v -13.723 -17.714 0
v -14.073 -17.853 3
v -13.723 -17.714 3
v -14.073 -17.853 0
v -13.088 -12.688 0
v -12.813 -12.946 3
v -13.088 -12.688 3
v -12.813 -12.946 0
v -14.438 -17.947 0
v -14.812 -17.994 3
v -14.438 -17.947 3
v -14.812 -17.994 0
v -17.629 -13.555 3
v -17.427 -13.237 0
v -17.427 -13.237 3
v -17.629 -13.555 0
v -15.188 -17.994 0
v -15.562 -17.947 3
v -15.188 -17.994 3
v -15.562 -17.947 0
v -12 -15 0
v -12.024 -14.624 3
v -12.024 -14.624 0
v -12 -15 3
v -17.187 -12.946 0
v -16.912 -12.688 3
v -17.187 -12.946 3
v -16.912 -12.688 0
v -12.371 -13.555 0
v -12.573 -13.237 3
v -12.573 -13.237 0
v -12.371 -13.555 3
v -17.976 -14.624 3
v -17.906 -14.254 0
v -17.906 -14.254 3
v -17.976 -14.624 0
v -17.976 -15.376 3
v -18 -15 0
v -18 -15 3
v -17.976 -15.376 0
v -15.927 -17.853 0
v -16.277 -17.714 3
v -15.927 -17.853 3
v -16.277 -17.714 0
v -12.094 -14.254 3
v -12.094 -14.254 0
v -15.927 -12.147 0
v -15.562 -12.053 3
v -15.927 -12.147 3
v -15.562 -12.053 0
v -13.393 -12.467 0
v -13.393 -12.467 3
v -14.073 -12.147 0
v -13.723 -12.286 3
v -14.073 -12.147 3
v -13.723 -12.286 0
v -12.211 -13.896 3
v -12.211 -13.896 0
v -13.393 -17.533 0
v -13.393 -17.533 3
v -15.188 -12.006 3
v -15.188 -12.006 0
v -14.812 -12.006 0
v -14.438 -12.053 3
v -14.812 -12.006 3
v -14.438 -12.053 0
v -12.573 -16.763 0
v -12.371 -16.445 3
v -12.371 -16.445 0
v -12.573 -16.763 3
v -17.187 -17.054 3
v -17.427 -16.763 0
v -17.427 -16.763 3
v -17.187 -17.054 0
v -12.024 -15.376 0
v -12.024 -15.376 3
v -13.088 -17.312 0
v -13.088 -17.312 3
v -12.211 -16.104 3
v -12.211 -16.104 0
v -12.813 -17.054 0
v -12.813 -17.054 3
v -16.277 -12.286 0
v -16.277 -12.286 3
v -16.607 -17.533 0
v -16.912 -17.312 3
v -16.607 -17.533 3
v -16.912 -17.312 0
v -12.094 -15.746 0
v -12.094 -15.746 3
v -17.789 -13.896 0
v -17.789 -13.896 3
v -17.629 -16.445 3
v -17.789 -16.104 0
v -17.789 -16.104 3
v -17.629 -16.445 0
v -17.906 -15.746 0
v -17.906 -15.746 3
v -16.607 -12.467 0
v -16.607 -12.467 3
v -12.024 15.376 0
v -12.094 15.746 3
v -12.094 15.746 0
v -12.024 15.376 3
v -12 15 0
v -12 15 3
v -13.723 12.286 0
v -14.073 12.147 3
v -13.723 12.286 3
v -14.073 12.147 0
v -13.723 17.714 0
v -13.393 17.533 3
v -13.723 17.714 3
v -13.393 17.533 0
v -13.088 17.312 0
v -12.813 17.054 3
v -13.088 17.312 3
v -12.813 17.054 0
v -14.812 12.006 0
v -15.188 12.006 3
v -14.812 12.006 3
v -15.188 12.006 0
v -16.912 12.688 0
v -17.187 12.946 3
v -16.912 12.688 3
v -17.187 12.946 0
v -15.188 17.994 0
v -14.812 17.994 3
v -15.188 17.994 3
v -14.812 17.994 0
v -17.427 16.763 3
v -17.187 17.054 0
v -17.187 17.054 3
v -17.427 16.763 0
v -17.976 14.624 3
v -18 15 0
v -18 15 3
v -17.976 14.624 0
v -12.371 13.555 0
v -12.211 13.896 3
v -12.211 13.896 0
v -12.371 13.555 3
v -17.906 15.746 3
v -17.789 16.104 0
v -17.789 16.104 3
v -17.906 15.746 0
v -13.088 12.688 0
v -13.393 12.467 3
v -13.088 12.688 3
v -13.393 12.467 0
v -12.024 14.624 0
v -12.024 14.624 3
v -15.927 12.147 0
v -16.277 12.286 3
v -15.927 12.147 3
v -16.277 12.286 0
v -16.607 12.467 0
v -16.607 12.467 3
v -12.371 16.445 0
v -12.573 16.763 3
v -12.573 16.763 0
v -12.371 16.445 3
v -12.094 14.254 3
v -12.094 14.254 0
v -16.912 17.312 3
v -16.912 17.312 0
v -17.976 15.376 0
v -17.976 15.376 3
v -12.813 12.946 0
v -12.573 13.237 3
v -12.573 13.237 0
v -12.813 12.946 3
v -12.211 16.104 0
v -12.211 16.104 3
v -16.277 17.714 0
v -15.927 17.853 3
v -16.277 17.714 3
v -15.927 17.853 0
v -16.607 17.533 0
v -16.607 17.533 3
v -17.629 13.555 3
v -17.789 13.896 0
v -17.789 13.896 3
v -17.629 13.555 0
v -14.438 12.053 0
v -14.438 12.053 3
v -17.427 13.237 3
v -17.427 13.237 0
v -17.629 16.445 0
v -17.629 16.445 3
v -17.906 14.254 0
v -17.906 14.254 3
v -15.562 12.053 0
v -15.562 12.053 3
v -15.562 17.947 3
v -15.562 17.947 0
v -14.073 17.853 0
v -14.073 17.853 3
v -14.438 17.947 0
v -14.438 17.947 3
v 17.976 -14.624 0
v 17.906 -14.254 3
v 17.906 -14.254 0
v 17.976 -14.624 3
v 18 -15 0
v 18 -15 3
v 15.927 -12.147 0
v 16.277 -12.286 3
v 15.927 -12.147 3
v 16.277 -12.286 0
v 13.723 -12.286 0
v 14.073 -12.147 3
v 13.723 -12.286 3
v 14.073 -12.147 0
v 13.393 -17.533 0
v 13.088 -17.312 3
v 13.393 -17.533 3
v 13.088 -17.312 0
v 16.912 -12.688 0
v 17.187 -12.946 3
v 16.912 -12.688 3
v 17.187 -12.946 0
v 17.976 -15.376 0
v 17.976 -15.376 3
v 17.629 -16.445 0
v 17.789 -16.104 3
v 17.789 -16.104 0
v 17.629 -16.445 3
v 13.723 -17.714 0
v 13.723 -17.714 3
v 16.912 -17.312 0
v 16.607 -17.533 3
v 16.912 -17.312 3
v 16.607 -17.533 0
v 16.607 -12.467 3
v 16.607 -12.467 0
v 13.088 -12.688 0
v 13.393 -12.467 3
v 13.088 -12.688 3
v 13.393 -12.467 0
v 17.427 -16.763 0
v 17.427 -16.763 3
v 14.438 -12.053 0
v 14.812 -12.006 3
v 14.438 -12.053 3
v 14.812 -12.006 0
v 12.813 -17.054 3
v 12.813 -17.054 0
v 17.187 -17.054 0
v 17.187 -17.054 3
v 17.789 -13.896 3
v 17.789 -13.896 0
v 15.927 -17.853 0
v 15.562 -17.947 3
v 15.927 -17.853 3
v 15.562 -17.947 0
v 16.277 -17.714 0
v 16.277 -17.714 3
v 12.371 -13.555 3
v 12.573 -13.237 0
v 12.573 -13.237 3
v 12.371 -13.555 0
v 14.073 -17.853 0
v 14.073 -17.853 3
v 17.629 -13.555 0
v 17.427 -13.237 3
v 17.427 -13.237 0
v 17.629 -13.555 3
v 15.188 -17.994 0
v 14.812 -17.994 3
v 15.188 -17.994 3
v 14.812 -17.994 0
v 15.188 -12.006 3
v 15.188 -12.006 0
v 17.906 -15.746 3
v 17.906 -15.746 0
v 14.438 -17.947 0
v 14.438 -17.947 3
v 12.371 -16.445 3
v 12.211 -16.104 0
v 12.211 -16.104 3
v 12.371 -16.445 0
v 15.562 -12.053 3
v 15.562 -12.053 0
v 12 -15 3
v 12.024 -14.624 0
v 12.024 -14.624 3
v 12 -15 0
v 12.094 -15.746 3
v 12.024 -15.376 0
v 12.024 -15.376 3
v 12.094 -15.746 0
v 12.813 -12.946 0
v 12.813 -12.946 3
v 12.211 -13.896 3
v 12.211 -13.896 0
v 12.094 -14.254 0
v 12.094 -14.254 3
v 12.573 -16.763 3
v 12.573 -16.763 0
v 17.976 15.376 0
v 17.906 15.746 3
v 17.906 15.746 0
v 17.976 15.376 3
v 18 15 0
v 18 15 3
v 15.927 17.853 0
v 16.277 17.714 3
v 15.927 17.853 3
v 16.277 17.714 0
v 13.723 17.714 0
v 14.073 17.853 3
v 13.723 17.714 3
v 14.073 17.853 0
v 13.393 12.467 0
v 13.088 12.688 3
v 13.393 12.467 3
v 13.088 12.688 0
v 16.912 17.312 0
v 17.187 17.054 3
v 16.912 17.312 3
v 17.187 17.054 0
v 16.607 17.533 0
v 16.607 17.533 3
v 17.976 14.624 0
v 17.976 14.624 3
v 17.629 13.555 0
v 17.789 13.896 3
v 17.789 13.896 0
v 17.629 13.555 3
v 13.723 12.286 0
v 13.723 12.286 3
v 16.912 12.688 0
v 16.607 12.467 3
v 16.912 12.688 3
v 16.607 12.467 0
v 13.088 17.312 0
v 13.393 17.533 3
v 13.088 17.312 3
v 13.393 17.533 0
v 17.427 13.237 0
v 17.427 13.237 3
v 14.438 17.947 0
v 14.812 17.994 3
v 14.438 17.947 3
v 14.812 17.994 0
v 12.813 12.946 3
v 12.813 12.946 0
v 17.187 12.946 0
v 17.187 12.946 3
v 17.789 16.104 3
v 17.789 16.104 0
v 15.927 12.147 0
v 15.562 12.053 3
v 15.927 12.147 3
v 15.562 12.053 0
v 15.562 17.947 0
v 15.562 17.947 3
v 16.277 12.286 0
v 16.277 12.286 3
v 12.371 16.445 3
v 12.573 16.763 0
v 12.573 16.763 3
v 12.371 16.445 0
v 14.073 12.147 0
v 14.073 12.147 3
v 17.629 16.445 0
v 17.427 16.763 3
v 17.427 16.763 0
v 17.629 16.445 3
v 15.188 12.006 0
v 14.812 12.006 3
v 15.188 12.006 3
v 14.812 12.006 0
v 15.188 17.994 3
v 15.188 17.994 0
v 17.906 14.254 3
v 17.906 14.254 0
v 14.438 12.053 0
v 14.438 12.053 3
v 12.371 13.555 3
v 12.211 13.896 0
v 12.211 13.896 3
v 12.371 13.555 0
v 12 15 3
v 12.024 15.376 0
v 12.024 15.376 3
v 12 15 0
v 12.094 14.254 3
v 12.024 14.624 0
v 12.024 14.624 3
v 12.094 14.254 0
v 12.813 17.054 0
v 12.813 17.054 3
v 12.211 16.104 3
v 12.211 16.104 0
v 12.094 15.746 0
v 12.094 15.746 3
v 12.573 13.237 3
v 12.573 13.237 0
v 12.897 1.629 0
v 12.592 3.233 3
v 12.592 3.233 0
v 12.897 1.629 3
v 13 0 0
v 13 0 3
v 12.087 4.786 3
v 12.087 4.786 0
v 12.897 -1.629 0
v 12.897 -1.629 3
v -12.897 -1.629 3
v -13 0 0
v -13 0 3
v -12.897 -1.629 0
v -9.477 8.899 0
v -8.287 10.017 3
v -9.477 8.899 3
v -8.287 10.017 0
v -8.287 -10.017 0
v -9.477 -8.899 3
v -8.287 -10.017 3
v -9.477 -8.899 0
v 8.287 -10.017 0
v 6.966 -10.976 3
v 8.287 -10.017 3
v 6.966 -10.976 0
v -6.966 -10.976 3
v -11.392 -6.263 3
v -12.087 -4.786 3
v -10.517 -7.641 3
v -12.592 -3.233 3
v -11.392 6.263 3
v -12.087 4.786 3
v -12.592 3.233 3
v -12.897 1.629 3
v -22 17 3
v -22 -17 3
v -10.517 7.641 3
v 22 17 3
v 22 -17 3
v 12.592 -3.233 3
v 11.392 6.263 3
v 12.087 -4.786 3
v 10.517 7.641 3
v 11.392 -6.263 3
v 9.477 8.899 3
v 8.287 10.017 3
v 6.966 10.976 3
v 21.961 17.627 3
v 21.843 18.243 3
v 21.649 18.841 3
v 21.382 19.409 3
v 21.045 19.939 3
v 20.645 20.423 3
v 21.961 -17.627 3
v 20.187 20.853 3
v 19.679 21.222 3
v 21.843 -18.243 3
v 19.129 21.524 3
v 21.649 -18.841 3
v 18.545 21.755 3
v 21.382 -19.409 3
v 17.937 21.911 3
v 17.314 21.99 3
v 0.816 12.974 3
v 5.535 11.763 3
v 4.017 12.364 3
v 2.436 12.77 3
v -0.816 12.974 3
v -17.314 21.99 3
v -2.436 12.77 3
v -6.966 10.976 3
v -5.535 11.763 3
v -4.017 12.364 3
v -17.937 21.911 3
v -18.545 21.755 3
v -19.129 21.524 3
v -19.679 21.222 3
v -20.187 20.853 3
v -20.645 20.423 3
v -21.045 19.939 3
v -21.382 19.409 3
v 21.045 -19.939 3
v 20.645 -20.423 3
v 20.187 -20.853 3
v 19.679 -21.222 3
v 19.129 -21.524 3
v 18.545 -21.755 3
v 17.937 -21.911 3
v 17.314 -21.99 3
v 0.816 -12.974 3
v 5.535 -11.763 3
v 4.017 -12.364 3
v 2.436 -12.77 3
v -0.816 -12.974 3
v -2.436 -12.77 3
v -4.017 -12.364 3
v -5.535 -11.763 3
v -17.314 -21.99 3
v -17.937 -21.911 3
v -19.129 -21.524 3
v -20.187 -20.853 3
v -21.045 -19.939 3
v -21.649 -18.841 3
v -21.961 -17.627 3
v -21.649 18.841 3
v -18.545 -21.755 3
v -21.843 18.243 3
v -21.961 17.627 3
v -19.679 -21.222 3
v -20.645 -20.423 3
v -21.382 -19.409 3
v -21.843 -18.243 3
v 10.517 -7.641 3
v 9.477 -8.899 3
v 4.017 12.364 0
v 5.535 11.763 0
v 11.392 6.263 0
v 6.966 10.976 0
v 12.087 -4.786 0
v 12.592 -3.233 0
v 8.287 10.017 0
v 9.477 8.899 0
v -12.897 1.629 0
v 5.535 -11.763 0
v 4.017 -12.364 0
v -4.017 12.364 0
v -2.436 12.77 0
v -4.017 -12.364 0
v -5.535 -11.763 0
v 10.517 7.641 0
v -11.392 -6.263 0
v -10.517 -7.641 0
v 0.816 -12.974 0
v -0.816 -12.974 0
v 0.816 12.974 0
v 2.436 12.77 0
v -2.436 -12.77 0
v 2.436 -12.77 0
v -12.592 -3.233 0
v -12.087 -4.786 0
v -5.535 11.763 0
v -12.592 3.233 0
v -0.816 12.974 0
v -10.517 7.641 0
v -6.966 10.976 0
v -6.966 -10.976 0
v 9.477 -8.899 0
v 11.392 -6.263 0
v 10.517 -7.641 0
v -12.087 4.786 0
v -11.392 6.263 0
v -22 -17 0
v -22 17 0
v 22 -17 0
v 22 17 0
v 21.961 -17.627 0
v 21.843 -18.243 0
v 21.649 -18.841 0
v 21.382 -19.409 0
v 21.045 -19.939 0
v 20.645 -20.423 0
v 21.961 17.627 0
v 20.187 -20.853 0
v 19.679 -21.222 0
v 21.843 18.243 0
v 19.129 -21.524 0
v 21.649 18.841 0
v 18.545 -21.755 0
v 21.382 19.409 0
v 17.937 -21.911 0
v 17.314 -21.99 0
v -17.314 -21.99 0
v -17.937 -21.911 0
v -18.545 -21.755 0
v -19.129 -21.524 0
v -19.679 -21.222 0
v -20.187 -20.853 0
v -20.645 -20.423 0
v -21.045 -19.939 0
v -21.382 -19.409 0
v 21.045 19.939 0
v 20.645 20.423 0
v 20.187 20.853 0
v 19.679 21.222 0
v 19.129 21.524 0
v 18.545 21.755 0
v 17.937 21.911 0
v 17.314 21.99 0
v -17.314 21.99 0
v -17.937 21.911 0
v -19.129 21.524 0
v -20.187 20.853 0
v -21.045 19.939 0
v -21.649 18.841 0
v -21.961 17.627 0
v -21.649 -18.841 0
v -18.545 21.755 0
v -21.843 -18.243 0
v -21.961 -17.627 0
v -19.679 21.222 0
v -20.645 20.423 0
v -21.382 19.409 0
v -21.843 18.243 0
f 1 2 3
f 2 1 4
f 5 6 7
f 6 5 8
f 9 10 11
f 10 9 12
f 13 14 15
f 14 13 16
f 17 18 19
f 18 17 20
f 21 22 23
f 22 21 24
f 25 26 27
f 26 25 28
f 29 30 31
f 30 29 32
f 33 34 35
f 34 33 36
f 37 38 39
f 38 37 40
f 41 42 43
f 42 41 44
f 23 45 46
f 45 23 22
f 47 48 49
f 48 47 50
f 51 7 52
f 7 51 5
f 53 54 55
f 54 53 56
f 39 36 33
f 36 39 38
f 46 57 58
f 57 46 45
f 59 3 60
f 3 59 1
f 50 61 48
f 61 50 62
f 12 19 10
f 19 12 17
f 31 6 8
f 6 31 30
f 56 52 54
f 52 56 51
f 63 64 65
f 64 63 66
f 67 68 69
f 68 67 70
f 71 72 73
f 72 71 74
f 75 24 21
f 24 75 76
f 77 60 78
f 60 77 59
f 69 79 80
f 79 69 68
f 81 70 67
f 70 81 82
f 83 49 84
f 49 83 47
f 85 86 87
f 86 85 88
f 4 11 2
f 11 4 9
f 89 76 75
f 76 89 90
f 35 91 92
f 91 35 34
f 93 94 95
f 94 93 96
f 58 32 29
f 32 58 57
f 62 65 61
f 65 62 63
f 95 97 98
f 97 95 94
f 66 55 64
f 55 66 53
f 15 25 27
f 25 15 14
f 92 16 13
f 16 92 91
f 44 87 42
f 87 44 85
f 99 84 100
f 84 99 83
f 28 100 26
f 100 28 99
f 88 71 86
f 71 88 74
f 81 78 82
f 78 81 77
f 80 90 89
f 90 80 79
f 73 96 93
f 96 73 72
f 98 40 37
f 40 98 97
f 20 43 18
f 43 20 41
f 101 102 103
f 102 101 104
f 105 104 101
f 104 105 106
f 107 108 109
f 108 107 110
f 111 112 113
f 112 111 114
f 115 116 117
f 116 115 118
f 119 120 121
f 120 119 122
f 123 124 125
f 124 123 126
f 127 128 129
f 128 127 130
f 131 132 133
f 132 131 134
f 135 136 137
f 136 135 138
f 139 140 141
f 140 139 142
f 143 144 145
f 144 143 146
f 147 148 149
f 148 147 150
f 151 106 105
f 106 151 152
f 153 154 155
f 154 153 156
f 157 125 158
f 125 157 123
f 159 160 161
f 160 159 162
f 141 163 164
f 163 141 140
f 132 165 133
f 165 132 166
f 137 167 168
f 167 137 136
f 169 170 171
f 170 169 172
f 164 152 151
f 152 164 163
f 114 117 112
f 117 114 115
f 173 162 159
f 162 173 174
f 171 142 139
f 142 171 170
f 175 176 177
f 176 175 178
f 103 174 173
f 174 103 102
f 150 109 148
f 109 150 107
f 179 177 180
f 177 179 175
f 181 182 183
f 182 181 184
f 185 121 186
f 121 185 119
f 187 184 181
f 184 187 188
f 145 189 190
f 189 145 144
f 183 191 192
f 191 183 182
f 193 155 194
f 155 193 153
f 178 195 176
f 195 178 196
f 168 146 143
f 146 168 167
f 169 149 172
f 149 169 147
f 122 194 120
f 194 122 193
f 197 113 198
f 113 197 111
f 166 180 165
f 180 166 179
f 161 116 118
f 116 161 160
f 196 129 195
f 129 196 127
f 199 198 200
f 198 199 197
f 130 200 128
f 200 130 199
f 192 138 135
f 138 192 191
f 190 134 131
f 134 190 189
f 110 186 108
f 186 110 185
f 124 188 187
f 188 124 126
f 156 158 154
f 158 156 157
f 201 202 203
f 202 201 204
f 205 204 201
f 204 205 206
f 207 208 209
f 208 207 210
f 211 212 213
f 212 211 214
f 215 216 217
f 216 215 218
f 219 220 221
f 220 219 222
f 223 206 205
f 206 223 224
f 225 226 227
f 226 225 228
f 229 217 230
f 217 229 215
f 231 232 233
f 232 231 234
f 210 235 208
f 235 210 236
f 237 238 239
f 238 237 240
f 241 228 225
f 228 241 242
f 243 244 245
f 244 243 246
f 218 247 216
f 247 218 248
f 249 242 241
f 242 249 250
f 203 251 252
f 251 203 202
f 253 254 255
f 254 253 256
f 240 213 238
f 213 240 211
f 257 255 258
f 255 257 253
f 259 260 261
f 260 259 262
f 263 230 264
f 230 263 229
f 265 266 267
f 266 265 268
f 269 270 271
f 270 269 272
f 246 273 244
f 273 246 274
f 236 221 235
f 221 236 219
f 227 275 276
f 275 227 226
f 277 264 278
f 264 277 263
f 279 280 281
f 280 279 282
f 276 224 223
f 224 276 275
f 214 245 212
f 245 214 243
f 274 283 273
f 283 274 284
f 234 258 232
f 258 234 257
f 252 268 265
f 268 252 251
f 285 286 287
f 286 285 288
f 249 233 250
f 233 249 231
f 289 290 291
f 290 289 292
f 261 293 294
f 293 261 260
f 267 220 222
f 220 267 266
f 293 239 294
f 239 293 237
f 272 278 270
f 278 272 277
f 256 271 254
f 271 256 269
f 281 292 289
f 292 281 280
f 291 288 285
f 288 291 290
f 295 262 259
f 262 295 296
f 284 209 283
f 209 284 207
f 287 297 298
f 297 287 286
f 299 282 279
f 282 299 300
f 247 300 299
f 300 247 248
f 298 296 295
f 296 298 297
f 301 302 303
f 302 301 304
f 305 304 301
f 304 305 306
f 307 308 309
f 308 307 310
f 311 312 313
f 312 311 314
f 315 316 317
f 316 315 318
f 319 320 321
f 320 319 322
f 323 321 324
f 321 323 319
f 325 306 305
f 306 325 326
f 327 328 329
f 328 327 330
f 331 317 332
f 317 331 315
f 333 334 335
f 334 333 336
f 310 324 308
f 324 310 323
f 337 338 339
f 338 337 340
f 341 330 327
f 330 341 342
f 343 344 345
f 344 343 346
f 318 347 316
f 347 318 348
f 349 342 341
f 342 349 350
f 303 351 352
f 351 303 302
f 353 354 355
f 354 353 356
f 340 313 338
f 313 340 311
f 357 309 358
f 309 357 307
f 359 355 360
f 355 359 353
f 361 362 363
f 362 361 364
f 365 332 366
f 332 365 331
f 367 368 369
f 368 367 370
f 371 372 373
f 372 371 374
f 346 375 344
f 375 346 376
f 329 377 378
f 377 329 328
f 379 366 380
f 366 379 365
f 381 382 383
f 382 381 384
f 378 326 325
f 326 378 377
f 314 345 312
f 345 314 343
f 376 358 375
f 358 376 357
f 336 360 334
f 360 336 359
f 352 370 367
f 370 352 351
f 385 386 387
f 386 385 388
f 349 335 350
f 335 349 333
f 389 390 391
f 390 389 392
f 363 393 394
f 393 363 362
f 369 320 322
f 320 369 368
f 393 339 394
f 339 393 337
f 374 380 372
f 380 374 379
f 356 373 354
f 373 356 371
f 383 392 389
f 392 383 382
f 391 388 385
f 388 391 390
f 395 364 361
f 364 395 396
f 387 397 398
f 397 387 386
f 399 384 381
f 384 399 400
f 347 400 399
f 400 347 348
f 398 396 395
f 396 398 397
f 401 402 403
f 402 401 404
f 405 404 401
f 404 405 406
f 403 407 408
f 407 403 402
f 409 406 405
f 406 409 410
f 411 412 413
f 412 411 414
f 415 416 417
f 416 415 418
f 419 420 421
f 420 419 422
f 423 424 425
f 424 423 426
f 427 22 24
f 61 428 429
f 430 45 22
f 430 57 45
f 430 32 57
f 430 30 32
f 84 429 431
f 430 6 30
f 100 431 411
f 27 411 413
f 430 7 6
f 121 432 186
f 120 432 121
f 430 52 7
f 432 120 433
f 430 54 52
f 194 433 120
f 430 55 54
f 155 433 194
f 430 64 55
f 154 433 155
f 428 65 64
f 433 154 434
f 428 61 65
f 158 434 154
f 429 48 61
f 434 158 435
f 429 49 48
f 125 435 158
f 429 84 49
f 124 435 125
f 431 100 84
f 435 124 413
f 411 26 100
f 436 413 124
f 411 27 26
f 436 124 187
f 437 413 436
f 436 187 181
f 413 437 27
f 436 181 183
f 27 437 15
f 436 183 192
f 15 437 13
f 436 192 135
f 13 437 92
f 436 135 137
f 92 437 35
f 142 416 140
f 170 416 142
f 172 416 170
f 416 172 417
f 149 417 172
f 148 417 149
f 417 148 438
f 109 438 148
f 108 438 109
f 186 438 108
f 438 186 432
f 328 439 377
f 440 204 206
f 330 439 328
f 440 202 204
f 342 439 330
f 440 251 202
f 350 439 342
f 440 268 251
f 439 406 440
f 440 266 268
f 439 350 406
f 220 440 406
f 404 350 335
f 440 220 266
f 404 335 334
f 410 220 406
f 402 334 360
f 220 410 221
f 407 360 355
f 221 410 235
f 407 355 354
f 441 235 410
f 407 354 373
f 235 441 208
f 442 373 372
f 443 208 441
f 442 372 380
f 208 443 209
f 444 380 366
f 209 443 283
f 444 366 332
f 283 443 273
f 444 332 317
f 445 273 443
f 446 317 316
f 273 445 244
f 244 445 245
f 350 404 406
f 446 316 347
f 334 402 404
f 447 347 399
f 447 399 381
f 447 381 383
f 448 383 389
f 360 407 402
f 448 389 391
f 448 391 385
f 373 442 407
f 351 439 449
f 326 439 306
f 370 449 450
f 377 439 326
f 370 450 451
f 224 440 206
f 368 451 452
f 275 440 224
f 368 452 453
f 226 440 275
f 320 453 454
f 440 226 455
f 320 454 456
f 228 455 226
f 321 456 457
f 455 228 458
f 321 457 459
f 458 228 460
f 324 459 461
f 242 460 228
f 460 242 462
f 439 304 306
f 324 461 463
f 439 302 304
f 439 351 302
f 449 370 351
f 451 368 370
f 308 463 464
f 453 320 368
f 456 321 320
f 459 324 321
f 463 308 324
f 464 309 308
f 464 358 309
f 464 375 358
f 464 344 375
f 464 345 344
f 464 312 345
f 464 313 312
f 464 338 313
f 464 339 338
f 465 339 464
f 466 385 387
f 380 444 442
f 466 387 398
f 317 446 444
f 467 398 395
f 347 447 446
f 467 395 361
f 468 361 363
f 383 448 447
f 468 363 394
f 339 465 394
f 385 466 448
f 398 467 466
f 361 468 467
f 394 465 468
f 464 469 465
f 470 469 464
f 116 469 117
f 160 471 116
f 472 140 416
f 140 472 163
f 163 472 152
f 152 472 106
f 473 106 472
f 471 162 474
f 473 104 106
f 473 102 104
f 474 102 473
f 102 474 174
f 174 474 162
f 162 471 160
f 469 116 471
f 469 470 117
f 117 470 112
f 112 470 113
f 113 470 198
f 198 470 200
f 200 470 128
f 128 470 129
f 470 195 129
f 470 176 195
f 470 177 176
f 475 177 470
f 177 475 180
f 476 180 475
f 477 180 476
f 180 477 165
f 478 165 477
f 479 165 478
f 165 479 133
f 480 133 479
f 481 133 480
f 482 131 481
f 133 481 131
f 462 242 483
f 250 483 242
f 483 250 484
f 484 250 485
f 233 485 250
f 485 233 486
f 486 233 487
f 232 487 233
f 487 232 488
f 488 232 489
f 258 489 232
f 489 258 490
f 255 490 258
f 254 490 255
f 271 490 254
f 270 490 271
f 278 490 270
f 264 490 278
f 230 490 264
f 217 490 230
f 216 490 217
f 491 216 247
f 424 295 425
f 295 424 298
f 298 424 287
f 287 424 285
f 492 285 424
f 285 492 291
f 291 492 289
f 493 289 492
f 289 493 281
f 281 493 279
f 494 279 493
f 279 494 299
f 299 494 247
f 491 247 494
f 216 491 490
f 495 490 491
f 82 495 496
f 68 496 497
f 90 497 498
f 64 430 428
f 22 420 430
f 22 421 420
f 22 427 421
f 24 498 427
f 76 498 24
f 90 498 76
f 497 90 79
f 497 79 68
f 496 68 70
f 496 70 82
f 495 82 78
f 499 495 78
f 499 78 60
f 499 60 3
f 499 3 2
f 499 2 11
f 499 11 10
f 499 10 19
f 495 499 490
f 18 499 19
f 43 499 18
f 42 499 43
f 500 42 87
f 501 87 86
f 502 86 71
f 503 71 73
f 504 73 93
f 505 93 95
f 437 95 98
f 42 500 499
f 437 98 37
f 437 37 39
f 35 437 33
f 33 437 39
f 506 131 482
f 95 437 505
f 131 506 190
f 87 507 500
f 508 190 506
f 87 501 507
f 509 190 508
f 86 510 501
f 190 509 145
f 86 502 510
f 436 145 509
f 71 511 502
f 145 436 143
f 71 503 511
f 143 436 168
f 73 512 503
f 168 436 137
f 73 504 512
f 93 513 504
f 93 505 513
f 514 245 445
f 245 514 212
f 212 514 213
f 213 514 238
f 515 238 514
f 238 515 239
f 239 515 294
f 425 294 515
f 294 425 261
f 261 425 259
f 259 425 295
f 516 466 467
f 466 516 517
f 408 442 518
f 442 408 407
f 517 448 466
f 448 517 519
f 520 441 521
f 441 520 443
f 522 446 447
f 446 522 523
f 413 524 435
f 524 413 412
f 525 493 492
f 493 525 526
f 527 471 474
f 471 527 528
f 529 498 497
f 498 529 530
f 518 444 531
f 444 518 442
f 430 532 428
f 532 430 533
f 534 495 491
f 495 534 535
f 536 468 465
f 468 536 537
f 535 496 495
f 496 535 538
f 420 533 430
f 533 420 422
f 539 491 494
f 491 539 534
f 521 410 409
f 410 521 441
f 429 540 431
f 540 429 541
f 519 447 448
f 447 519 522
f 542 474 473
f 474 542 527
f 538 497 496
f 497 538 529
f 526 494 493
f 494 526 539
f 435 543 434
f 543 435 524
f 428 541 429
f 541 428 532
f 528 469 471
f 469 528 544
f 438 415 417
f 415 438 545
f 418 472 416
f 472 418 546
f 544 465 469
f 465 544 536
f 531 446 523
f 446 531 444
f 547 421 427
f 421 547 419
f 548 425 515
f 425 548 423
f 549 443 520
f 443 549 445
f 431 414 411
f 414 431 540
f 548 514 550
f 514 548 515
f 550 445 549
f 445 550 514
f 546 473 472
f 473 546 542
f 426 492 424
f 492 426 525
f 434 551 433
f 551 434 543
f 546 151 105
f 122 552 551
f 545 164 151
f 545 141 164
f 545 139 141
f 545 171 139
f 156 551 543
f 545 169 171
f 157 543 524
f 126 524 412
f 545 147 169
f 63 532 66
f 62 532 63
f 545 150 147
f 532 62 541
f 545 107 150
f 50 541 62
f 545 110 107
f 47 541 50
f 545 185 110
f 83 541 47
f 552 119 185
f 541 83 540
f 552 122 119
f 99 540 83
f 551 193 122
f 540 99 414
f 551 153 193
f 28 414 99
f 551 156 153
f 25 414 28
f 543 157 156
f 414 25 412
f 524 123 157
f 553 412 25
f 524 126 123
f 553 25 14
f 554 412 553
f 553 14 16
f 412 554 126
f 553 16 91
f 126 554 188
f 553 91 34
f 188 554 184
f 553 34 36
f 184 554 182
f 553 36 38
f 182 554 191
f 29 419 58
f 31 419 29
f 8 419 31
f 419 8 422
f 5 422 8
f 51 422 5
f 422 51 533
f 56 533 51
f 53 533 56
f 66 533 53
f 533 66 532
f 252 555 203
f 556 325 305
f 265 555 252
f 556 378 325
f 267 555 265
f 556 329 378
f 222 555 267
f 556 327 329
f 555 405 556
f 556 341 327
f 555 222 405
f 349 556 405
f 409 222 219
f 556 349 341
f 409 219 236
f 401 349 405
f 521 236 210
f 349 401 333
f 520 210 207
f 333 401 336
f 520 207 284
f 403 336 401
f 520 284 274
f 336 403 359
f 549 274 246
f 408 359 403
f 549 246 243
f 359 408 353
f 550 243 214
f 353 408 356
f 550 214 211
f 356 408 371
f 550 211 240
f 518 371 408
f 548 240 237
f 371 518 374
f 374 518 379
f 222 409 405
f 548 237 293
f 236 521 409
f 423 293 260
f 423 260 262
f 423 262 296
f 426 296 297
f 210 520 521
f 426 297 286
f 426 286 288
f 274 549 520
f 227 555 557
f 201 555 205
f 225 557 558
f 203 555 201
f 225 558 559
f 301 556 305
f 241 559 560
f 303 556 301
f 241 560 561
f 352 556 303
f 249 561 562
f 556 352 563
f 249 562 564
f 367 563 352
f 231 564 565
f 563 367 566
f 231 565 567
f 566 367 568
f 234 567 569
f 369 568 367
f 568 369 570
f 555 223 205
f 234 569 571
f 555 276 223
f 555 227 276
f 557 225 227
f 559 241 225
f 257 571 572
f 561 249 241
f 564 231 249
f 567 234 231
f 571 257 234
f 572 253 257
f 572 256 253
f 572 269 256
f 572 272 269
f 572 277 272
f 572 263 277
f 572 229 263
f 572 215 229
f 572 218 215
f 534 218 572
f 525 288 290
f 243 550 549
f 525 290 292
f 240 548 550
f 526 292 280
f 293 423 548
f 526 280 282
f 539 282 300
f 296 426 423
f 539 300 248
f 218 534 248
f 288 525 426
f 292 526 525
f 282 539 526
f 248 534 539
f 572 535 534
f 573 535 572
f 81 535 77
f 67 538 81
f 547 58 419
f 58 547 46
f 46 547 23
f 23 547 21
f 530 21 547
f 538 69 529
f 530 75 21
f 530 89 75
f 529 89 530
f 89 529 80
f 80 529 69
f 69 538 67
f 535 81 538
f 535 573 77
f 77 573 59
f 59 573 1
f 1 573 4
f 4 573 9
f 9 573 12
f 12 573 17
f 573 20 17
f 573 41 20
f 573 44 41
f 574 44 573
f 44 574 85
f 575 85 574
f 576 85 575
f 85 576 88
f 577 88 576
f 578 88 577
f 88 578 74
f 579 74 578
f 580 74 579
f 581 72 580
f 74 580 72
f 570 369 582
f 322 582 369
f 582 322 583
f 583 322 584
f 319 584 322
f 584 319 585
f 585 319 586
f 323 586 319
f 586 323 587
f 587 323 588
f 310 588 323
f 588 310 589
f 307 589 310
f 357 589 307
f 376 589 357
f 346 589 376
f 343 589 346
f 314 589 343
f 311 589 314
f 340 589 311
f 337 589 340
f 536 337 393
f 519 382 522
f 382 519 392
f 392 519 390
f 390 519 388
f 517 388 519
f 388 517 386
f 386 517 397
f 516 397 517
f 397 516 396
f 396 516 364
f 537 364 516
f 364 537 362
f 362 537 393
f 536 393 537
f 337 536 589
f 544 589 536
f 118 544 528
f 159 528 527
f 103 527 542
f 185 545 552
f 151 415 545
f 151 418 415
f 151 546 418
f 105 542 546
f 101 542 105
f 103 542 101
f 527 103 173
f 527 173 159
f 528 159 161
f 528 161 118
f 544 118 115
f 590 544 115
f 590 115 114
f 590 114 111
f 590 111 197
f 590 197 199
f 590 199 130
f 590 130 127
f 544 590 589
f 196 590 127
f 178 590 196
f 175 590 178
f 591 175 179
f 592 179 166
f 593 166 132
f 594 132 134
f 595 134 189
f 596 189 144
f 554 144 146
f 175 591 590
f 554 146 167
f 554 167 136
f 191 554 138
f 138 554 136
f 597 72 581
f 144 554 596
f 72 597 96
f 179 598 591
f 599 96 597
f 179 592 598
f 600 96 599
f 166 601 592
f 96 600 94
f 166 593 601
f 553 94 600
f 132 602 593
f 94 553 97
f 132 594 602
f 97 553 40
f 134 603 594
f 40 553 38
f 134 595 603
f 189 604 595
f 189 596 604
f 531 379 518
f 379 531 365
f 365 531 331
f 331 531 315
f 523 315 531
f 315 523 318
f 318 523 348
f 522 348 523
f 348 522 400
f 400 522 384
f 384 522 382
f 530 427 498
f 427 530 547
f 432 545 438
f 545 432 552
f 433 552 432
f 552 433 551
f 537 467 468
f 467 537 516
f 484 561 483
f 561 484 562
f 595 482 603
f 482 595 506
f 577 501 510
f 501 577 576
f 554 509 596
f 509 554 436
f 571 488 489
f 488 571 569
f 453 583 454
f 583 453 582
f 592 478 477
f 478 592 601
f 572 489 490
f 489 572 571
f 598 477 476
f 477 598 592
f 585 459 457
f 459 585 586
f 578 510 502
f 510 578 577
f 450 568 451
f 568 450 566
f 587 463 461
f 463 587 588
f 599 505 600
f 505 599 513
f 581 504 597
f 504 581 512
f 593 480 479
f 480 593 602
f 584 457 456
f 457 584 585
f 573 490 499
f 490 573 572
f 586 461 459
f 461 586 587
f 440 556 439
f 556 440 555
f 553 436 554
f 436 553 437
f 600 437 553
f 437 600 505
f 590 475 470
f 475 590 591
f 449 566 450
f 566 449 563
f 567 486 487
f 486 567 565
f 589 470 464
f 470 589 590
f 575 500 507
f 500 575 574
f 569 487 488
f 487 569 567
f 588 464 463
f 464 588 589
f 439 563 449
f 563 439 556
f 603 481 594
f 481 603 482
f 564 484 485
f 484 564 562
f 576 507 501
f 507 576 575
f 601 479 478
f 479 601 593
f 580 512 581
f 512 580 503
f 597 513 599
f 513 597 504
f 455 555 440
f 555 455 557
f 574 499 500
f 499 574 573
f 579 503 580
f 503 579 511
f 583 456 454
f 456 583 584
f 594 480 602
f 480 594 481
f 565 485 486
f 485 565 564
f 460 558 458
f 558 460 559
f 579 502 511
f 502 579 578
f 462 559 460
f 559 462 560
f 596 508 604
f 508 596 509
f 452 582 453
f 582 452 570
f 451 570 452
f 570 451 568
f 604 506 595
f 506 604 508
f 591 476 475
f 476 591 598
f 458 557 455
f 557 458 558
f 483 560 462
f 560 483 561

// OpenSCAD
$fn = 50;


difference() {
	union() {
		hull() {
			translate(v = [-17.0000000000, 17.0000000000, 0]) {
				cylinder(h = 3, r = 5);
			}
			translate(v = [17.0000000000, 17.0000000000, 0]) {
				cylinder(h = 3, r = 5);
			}
			translate(v = [-17.0000000000, -17.0000000000, 0]) {
				cylinder(h = 3, r = 5);
			}
			translate(v = [17.0000000000, -17.0000000000, 0]) {
				cylinder(h = 3, r = 5);
			}
		}
	}
	union() {
		#translate(v = [-15.0000000000, -15.0000000000, -100.0000000000]) {
			cylinder(h = 200, r = 3.0000000000);
		}
		#translate(v = [-15.0000000000, 15.0000000000, -100.0000000000]) {
			cylinder(h = 200, r = 3.0000000000);
		}
		#translate(v = [15.0000000000, -15.0000000000, -100.0000000000]) {
			cylinder(h = 200, r = 3.0000000000);
		}
		#translate(v = [15.0000000000, 15.0000000000, -100.0000000000]) {
			cylinder(h = 200, r = 3.0000000000);
		}
		#cylinder(h = 3, r = 13.0000000000);
	}
}
